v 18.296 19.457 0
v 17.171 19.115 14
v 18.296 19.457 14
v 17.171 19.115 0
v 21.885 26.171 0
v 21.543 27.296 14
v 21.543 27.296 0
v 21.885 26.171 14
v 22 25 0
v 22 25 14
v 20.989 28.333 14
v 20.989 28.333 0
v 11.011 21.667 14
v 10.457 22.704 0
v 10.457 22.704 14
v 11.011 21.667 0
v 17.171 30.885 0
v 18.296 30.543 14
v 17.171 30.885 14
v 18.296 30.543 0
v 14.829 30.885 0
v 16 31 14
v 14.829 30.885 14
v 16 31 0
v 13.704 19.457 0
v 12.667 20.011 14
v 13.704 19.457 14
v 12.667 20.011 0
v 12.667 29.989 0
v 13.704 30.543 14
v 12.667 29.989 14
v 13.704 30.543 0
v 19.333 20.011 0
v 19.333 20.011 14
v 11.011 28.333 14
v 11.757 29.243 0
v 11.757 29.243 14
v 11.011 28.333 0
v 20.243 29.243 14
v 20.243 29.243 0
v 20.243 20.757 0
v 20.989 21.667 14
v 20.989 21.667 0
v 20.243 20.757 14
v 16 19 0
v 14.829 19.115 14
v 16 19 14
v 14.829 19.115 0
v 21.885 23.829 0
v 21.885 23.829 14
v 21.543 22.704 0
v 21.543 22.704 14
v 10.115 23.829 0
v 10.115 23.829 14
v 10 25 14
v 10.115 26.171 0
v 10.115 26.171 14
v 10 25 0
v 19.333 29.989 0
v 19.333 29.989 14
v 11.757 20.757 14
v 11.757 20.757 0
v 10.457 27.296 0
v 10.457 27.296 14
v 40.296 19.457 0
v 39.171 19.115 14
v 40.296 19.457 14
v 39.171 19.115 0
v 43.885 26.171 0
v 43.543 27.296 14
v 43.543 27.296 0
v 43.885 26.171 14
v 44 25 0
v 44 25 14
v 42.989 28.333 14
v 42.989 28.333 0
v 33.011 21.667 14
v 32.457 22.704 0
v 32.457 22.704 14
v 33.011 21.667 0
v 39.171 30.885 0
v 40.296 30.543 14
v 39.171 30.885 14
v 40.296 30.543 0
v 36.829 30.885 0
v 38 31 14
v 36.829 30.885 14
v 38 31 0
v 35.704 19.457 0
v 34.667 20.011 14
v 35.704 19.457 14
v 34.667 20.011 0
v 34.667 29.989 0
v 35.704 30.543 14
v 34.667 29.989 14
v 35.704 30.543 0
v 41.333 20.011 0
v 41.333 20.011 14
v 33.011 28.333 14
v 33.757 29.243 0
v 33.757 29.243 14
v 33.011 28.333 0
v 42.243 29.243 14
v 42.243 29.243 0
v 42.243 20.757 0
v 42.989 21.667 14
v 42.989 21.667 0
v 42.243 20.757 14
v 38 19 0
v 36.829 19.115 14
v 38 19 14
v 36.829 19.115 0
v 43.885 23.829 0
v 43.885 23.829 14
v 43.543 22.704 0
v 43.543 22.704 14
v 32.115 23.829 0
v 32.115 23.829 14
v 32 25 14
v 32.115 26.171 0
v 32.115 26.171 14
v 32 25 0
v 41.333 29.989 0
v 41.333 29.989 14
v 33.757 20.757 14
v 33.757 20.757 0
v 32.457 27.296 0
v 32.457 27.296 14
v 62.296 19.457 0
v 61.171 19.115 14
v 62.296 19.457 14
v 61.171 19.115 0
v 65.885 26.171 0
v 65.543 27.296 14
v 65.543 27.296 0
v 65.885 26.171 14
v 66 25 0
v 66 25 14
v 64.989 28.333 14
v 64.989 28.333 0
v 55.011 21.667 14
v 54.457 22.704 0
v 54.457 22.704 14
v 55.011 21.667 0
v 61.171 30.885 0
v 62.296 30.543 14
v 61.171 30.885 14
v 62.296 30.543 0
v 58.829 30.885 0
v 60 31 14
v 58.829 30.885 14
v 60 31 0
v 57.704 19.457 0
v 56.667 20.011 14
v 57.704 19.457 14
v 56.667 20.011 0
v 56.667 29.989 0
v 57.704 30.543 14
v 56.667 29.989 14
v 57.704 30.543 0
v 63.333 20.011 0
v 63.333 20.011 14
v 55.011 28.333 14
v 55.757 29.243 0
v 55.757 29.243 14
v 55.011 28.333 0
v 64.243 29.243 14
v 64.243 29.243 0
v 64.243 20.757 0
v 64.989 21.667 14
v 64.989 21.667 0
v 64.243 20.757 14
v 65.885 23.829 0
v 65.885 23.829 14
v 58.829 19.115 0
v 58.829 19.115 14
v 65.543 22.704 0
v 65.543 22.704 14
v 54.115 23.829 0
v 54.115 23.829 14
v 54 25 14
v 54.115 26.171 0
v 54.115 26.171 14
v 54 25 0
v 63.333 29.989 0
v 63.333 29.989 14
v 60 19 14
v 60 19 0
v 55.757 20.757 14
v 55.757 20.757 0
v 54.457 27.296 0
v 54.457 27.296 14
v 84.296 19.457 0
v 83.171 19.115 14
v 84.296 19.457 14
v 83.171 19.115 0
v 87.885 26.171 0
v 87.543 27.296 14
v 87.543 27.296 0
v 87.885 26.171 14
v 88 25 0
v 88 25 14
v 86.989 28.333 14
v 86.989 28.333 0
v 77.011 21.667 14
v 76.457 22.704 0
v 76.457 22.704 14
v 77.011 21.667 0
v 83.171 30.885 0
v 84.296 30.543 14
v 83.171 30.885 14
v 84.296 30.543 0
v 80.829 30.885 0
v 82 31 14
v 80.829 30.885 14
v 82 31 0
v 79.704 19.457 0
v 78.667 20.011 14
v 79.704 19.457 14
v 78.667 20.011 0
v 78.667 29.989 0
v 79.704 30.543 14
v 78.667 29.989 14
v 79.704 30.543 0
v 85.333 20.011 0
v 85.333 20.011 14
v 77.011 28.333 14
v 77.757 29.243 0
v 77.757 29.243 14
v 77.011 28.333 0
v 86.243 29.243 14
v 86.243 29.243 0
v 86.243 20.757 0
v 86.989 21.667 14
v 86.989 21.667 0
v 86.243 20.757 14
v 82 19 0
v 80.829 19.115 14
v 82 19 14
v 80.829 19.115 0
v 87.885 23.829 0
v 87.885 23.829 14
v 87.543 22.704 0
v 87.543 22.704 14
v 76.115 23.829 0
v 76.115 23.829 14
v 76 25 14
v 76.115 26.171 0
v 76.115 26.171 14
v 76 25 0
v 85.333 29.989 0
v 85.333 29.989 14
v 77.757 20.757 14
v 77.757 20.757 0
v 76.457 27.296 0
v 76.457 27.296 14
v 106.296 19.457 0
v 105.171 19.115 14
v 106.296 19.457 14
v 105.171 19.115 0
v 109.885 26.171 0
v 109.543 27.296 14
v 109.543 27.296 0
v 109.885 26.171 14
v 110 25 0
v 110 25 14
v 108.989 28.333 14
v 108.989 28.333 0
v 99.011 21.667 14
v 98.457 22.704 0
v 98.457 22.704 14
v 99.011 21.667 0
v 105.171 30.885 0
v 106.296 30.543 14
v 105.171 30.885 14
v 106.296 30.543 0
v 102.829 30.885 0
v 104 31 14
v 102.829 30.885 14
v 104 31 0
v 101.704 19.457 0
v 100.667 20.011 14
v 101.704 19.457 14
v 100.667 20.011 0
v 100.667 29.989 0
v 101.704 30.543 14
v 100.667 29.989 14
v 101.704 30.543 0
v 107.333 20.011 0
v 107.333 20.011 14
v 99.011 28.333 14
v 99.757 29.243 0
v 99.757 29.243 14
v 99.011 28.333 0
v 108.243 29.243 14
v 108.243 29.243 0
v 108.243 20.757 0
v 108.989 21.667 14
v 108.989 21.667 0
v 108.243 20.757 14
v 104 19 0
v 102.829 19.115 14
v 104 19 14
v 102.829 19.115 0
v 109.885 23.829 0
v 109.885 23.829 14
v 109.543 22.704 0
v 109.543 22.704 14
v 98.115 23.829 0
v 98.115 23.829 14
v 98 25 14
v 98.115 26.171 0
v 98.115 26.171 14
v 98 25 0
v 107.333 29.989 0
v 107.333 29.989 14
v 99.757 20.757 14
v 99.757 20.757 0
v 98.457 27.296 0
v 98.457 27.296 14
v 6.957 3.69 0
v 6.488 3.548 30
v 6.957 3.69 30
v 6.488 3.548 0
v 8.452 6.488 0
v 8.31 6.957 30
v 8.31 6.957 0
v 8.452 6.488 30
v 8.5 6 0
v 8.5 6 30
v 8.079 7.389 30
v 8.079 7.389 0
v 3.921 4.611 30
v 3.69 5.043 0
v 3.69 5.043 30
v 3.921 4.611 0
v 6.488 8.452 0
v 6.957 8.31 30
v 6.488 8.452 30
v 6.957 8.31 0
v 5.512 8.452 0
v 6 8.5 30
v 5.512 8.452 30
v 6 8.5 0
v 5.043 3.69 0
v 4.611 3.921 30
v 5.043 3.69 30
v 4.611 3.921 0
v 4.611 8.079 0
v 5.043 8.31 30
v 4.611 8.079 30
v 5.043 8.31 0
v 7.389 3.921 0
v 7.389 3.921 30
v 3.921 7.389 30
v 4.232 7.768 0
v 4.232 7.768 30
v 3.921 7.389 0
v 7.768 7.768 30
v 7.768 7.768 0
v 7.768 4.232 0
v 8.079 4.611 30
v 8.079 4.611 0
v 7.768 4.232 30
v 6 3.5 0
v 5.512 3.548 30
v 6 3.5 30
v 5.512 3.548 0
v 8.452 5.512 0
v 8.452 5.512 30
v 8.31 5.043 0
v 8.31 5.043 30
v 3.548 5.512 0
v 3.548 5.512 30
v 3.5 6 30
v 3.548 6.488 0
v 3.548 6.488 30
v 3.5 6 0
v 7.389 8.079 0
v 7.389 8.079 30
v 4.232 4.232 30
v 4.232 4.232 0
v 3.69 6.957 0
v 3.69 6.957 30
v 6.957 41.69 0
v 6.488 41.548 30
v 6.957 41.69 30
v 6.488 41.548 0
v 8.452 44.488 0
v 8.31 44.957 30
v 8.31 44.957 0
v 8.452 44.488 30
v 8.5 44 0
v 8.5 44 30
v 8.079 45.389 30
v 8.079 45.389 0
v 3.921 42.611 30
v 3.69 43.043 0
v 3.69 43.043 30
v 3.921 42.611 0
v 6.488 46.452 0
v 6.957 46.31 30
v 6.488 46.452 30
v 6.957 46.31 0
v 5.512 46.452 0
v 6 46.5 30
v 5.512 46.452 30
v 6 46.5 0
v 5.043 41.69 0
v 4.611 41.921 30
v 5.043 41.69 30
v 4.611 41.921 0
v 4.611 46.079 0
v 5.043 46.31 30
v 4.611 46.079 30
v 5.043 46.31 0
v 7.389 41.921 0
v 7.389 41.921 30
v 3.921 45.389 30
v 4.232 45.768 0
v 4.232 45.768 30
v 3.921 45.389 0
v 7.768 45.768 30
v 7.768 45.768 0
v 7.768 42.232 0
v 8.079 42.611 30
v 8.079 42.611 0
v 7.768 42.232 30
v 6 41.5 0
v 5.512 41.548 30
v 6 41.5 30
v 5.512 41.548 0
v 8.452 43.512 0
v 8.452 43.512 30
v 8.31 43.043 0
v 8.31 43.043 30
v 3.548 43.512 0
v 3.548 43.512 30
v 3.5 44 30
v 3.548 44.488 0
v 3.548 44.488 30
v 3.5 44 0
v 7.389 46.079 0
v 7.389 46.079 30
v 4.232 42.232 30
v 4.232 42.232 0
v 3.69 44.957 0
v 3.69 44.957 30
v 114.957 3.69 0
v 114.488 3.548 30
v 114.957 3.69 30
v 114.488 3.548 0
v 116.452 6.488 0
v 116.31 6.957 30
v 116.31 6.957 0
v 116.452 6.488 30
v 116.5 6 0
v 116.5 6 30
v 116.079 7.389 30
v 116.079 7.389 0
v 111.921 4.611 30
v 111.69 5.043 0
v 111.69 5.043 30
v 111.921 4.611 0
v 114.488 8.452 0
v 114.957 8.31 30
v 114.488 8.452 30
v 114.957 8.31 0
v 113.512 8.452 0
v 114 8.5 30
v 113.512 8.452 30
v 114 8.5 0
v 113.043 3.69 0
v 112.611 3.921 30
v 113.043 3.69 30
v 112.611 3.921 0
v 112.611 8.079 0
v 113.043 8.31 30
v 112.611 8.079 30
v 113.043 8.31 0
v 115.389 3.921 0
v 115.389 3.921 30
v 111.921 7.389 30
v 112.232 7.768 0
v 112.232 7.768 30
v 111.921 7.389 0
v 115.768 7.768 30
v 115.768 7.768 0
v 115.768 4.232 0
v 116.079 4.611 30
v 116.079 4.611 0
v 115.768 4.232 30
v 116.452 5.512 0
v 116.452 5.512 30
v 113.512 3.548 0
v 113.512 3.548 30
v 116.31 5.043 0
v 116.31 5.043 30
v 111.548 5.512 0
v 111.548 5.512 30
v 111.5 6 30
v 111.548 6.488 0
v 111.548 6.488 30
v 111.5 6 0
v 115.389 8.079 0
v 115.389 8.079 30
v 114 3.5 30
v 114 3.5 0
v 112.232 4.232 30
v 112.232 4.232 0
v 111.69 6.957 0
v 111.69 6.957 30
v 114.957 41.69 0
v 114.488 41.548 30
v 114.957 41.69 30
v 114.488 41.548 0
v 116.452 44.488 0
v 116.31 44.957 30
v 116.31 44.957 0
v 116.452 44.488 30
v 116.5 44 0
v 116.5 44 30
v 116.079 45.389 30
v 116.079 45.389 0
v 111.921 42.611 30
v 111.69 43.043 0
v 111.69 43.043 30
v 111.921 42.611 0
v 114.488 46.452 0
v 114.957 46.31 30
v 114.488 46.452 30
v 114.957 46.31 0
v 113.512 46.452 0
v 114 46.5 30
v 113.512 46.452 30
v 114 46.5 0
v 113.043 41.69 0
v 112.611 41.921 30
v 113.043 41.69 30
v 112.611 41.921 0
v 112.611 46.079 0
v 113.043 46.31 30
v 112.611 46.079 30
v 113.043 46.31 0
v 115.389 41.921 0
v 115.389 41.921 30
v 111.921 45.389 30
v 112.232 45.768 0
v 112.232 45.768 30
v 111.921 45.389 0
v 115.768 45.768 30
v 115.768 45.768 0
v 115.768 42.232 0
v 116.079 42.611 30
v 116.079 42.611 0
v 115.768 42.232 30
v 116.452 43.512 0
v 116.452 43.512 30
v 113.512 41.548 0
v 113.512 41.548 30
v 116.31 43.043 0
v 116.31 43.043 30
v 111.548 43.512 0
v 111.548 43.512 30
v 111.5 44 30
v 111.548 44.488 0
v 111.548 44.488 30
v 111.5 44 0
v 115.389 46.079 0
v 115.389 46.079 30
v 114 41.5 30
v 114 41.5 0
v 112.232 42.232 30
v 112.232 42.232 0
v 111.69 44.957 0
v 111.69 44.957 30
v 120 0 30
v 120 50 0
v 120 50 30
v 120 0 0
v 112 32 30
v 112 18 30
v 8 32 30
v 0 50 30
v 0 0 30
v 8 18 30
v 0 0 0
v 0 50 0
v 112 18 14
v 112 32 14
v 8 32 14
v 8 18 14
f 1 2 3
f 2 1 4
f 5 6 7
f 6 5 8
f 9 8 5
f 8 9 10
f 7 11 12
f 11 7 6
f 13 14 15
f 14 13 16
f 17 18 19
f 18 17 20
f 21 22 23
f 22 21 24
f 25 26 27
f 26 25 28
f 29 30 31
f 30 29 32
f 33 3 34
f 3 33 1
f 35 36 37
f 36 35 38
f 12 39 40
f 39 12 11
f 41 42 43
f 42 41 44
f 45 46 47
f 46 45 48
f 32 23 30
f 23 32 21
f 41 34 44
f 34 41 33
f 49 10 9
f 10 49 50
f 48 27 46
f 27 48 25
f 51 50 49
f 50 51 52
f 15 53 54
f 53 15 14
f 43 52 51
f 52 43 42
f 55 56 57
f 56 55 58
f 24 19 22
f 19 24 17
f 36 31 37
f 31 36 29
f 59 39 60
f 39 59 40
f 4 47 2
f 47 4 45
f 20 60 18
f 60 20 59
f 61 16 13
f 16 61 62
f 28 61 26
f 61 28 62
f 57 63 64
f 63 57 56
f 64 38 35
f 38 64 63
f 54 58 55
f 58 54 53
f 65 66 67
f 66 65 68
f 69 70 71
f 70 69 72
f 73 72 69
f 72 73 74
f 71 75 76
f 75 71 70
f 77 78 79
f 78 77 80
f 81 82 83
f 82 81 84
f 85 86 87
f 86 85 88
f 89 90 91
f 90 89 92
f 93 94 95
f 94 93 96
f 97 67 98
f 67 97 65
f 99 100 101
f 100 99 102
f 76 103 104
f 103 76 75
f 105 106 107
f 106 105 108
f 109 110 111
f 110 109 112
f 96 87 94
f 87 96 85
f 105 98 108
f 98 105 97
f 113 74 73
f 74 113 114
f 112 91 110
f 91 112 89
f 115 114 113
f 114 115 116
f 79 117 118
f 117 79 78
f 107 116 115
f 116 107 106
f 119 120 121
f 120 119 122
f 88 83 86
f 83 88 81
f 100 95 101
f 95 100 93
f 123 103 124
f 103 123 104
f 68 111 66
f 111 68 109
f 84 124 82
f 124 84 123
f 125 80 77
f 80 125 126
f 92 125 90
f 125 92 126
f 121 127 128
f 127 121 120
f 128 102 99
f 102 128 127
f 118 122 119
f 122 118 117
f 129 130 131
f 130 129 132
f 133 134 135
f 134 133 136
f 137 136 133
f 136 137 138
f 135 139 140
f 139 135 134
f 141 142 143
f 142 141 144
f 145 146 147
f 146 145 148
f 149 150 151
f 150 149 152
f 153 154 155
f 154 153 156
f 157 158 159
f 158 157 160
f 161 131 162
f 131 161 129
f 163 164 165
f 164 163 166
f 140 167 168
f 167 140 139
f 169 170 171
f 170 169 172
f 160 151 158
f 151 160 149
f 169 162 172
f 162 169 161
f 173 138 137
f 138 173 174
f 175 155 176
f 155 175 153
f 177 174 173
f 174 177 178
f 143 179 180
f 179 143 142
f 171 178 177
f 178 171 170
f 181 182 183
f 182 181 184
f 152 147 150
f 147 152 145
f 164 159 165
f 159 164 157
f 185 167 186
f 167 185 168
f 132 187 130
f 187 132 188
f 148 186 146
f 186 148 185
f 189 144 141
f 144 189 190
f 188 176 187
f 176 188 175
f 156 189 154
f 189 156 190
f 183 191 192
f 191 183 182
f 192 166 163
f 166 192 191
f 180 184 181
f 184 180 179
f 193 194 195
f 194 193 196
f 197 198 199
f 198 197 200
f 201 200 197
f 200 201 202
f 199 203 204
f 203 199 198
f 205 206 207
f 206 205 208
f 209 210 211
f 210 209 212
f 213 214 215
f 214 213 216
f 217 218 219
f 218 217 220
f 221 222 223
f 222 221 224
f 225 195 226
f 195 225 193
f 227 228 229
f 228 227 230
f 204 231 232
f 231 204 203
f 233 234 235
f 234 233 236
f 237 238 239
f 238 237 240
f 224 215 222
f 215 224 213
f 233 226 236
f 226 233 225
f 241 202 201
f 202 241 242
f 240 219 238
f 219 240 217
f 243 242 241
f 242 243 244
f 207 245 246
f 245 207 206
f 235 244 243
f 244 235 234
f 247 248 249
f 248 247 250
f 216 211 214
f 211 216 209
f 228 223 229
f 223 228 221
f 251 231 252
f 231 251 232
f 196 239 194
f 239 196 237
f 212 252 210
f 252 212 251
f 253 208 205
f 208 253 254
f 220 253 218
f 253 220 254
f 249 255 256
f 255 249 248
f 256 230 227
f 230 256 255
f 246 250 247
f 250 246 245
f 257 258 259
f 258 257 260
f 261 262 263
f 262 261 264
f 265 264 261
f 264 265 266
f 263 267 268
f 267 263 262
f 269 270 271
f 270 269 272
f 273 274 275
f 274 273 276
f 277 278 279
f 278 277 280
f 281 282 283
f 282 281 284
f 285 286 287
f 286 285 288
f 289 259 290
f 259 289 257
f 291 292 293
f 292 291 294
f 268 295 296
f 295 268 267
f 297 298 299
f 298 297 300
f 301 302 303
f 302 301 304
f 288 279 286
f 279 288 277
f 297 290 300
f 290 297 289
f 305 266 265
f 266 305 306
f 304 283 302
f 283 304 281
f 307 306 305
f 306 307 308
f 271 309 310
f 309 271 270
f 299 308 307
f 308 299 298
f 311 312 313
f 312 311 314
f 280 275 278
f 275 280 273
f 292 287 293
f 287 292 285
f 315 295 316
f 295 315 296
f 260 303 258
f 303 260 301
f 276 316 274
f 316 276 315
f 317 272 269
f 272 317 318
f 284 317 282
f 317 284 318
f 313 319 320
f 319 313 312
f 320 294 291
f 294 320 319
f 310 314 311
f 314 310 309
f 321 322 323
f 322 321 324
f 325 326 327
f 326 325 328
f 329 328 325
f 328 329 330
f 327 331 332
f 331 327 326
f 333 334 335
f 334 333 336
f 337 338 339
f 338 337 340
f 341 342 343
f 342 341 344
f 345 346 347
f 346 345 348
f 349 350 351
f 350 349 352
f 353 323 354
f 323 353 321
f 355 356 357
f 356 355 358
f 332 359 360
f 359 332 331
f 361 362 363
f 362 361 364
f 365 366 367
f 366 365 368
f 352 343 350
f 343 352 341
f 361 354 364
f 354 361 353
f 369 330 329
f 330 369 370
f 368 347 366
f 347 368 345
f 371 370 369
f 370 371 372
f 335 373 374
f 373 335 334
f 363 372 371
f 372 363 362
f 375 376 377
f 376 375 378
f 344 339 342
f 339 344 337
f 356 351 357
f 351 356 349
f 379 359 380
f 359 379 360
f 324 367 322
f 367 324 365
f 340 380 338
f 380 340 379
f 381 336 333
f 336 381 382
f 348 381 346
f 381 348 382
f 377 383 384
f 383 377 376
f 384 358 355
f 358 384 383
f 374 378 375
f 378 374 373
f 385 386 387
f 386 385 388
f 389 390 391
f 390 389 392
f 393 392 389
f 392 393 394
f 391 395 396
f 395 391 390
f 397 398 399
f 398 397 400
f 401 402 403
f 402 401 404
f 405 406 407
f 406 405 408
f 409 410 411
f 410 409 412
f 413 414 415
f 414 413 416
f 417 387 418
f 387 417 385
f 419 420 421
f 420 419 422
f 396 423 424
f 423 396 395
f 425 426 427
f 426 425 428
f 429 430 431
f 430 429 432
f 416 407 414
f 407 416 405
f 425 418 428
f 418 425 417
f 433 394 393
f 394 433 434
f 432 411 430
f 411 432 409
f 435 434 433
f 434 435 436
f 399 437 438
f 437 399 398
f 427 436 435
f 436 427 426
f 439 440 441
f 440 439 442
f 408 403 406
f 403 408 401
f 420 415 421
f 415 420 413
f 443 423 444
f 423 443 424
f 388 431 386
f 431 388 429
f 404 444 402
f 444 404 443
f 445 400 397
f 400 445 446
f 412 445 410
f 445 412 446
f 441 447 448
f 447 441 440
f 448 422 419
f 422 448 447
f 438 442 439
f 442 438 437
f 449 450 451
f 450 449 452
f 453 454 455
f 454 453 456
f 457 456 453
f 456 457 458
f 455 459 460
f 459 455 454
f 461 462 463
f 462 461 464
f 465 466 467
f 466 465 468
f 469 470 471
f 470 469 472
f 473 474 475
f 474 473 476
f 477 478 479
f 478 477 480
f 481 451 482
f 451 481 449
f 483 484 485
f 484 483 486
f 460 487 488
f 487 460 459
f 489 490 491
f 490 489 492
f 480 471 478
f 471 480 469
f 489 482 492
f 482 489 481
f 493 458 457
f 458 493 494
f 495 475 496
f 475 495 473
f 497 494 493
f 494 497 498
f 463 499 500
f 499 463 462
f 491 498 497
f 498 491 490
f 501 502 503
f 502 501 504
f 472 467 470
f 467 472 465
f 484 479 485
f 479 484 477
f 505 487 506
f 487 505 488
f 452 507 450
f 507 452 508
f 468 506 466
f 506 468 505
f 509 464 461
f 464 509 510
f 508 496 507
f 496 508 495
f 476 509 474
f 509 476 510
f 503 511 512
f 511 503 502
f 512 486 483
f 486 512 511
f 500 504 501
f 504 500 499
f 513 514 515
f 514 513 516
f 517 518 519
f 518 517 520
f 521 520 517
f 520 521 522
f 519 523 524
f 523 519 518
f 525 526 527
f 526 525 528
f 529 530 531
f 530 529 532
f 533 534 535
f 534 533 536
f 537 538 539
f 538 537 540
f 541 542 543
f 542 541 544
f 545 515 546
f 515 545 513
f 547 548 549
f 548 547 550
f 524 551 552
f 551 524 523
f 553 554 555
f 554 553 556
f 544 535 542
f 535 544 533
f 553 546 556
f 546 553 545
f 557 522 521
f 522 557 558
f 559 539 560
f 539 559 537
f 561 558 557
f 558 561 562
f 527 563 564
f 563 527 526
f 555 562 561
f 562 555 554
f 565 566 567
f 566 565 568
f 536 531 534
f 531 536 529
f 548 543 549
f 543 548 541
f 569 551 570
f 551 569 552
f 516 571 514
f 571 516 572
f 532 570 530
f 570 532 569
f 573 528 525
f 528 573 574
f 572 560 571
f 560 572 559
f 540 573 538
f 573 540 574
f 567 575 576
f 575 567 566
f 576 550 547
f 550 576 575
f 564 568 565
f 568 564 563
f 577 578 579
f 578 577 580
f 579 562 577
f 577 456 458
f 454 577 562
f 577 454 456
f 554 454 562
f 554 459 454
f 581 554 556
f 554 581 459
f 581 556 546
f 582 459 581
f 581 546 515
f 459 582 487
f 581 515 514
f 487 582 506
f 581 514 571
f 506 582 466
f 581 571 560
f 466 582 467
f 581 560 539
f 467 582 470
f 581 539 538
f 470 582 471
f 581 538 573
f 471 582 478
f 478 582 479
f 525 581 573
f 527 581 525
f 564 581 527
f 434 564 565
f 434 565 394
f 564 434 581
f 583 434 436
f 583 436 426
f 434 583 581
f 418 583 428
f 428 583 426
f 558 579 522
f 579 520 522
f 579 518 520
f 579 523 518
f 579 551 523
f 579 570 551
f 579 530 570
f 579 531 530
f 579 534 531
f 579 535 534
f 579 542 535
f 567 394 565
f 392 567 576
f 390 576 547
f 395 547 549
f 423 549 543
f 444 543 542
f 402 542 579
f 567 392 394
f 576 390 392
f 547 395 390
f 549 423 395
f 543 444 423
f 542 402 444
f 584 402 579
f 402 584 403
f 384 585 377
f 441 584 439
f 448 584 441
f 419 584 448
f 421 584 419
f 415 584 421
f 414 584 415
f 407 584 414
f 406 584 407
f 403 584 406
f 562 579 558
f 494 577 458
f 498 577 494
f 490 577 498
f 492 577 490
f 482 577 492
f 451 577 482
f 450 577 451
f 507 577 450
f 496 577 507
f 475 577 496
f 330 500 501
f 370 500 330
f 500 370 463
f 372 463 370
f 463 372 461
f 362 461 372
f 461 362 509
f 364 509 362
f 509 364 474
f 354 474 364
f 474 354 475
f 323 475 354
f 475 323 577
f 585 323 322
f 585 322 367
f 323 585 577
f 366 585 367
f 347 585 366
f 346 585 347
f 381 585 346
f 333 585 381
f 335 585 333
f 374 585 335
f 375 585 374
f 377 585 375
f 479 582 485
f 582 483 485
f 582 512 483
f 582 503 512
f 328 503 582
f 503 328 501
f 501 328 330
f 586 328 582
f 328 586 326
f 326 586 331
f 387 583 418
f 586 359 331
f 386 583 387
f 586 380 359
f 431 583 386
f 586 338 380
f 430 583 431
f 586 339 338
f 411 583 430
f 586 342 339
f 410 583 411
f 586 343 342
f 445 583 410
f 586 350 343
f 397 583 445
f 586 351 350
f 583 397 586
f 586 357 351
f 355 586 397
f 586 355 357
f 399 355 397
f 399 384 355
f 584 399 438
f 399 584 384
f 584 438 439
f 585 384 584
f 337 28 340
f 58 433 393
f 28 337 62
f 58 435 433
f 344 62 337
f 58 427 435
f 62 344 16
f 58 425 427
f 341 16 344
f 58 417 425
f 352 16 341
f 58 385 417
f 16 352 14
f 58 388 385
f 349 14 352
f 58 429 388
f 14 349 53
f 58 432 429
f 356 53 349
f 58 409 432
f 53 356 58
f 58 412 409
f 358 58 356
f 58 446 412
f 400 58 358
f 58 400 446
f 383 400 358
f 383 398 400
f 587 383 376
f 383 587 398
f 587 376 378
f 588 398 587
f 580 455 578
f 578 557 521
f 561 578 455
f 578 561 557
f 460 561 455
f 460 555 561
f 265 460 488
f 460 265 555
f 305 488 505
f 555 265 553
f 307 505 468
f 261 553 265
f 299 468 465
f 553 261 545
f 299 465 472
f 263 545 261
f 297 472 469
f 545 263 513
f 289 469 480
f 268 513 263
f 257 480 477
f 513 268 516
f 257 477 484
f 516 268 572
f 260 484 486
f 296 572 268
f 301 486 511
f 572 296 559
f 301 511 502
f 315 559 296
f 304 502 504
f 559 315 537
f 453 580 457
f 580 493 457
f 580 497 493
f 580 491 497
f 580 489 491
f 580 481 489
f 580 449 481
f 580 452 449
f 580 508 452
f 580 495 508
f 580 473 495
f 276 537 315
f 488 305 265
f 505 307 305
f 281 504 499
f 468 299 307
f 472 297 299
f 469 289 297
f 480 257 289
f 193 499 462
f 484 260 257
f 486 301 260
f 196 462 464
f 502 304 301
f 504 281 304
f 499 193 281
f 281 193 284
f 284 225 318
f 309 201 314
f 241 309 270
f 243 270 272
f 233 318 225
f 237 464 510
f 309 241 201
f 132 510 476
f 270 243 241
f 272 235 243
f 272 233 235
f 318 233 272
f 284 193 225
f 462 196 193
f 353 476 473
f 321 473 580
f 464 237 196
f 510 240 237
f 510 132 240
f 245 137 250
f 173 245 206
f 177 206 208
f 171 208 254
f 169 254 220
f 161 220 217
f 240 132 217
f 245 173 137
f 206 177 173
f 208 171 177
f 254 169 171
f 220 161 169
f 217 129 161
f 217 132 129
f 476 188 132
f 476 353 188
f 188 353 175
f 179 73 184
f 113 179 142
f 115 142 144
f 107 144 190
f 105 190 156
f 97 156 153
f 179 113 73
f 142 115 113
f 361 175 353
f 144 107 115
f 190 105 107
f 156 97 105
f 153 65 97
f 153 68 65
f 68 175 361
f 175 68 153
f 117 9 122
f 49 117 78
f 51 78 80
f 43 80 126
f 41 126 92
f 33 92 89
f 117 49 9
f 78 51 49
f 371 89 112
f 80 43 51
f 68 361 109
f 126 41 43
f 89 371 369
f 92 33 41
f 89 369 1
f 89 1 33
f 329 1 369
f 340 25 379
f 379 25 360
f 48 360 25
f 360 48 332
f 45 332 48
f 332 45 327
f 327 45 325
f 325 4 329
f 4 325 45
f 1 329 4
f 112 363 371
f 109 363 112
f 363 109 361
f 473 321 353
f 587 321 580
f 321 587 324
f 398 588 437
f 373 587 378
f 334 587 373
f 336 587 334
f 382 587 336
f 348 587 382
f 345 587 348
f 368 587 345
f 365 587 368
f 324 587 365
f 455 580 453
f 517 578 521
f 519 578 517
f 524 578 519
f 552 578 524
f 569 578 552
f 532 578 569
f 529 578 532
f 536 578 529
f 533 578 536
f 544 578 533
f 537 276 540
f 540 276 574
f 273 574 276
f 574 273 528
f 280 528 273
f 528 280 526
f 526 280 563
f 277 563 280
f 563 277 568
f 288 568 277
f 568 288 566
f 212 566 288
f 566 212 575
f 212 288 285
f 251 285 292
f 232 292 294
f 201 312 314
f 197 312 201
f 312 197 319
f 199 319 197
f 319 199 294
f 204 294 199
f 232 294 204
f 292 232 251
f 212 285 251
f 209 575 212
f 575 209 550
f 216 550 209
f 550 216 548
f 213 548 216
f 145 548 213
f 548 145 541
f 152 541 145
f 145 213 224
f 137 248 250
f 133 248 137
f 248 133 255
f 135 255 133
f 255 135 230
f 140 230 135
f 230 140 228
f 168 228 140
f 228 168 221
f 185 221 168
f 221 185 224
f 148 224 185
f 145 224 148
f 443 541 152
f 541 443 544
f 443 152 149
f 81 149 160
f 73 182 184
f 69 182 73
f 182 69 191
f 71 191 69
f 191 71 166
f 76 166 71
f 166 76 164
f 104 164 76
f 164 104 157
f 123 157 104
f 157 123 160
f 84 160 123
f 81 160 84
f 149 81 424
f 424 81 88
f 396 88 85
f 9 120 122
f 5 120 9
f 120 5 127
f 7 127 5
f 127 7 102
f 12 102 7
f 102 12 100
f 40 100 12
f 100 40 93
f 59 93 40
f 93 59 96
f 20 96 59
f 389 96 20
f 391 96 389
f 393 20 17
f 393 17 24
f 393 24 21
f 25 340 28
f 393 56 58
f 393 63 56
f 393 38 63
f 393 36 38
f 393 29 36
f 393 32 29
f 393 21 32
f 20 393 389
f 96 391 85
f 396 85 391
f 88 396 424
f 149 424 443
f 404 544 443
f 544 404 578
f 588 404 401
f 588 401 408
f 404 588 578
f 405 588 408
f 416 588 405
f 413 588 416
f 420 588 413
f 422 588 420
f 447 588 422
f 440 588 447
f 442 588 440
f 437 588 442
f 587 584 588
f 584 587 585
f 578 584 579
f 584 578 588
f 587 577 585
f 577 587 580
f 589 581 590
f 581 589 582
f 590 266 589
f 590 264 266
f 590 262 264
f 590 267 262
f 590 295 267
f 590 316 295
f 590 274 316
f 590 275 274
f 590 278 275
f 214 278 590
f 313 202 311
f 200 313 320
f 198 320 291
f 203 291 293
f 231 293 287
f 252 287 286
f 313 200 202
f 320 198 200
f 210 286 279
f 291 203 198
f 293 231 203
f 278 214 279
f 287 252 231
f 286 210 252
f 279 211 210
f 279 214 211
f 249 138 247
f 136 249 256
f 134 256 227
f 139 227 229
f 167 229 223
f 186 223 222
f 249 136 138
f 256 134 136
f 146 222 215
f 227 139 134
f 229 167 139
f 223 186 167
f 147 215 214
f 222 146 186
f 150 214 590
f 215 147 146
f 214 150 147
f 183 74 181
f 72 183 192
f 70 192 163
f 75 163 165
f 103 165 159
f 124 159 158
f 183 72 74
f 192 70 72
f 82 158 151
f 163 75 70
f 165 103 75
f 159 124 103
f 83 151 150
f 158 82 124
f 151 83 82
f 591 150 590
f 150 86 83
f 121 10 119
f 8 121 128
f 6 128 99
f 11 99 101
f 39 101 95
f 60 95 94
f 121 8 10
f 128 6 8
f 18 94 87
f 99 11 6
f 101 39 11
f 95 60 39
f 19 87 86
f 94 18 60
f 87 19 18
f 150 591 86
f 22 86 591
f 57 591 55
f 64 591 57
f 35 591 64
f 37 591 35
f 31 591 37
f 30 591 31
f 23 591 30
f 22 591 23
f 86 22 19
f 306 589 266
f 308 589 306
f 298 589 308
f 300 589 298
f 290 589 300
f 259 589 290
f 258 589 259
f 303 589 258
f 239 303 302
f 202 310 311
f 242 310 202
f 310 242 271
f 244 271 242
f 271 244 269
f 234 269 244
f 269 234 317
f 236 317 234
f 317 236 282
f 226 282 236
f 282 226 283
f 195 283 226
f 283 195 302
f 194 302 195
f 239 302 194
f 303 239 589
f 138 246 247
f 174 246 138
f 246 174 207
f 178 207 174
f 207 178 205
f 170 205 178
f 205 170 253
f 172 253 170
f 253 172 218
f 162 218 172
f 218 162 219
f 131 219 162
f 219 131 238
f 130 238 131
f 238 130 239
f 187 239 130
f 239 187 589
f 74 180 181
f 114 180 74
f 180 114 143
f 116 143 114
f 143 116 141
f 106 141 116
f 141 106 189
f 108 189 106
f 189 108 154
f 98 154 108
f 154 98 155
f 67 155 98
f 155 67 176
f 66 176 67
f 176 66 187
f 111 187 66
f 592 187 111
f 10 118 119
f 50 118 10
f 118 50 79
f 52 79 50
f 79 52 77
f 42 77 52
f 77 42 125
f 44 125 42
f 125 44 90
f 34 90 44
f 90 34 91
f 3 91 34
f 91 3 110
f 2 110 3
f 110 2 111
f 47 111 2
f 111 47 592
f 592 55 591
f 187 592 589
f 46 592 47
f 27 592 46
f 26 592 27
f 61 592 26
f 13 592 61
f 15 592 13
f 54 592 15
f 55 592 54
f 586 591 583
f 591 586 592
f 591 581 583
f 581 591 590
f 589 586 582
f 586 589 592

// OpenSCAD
$fn = 32;

// ----------------------------------------------------------------------
// Manifold block: gallery_top manifold
// ----------------------------------------------------------------------

// --- parameters (mm) ---
block_l = 120;            // block length, X
block_w = 50;             // block width, Y
block_h = 30;             // block height, Z
port_d = 12;              // port bore diameter
port_pitch = 22;          // port pitch along X
gallery_d = 14;           // top gallery width, Y
gallery_depth = 16;       // gallery pocket depth
wall_p = 8;               // gallery end wall thickness, X
mnt_d = 5;                // mounting hole diameter
mnt_in = 6;               // mounting hole inset from the edges

n_ports = 5;  // ports in the row
port_x0 = (block_l - (n_ports - 1) * port_pitch) / 2;  // first port X

difference() {
  cube([block_l, block_w, block_h]);
  for (i = [0 : n_ports - 1])
    translate([port_x0 + i * port_pitch, block_w / 2, -1])
      cylinder(h = block_h + 2, d = port_d);
  translate([wall_p, block_w / 2 - gallery_d / 2, block_h - gallery_depth])
    cube([block_l - 2 * wall_p, gallery_d, gallery_depth + 1]);
  for (cx = [mnt_in, block_l - mnt_in])
    for (cy = [mnt_in, block_w - mnt_in])
      translate([cx, cy, -1]) cylinder(h = block_h + 2, d = mnt_d);
}
